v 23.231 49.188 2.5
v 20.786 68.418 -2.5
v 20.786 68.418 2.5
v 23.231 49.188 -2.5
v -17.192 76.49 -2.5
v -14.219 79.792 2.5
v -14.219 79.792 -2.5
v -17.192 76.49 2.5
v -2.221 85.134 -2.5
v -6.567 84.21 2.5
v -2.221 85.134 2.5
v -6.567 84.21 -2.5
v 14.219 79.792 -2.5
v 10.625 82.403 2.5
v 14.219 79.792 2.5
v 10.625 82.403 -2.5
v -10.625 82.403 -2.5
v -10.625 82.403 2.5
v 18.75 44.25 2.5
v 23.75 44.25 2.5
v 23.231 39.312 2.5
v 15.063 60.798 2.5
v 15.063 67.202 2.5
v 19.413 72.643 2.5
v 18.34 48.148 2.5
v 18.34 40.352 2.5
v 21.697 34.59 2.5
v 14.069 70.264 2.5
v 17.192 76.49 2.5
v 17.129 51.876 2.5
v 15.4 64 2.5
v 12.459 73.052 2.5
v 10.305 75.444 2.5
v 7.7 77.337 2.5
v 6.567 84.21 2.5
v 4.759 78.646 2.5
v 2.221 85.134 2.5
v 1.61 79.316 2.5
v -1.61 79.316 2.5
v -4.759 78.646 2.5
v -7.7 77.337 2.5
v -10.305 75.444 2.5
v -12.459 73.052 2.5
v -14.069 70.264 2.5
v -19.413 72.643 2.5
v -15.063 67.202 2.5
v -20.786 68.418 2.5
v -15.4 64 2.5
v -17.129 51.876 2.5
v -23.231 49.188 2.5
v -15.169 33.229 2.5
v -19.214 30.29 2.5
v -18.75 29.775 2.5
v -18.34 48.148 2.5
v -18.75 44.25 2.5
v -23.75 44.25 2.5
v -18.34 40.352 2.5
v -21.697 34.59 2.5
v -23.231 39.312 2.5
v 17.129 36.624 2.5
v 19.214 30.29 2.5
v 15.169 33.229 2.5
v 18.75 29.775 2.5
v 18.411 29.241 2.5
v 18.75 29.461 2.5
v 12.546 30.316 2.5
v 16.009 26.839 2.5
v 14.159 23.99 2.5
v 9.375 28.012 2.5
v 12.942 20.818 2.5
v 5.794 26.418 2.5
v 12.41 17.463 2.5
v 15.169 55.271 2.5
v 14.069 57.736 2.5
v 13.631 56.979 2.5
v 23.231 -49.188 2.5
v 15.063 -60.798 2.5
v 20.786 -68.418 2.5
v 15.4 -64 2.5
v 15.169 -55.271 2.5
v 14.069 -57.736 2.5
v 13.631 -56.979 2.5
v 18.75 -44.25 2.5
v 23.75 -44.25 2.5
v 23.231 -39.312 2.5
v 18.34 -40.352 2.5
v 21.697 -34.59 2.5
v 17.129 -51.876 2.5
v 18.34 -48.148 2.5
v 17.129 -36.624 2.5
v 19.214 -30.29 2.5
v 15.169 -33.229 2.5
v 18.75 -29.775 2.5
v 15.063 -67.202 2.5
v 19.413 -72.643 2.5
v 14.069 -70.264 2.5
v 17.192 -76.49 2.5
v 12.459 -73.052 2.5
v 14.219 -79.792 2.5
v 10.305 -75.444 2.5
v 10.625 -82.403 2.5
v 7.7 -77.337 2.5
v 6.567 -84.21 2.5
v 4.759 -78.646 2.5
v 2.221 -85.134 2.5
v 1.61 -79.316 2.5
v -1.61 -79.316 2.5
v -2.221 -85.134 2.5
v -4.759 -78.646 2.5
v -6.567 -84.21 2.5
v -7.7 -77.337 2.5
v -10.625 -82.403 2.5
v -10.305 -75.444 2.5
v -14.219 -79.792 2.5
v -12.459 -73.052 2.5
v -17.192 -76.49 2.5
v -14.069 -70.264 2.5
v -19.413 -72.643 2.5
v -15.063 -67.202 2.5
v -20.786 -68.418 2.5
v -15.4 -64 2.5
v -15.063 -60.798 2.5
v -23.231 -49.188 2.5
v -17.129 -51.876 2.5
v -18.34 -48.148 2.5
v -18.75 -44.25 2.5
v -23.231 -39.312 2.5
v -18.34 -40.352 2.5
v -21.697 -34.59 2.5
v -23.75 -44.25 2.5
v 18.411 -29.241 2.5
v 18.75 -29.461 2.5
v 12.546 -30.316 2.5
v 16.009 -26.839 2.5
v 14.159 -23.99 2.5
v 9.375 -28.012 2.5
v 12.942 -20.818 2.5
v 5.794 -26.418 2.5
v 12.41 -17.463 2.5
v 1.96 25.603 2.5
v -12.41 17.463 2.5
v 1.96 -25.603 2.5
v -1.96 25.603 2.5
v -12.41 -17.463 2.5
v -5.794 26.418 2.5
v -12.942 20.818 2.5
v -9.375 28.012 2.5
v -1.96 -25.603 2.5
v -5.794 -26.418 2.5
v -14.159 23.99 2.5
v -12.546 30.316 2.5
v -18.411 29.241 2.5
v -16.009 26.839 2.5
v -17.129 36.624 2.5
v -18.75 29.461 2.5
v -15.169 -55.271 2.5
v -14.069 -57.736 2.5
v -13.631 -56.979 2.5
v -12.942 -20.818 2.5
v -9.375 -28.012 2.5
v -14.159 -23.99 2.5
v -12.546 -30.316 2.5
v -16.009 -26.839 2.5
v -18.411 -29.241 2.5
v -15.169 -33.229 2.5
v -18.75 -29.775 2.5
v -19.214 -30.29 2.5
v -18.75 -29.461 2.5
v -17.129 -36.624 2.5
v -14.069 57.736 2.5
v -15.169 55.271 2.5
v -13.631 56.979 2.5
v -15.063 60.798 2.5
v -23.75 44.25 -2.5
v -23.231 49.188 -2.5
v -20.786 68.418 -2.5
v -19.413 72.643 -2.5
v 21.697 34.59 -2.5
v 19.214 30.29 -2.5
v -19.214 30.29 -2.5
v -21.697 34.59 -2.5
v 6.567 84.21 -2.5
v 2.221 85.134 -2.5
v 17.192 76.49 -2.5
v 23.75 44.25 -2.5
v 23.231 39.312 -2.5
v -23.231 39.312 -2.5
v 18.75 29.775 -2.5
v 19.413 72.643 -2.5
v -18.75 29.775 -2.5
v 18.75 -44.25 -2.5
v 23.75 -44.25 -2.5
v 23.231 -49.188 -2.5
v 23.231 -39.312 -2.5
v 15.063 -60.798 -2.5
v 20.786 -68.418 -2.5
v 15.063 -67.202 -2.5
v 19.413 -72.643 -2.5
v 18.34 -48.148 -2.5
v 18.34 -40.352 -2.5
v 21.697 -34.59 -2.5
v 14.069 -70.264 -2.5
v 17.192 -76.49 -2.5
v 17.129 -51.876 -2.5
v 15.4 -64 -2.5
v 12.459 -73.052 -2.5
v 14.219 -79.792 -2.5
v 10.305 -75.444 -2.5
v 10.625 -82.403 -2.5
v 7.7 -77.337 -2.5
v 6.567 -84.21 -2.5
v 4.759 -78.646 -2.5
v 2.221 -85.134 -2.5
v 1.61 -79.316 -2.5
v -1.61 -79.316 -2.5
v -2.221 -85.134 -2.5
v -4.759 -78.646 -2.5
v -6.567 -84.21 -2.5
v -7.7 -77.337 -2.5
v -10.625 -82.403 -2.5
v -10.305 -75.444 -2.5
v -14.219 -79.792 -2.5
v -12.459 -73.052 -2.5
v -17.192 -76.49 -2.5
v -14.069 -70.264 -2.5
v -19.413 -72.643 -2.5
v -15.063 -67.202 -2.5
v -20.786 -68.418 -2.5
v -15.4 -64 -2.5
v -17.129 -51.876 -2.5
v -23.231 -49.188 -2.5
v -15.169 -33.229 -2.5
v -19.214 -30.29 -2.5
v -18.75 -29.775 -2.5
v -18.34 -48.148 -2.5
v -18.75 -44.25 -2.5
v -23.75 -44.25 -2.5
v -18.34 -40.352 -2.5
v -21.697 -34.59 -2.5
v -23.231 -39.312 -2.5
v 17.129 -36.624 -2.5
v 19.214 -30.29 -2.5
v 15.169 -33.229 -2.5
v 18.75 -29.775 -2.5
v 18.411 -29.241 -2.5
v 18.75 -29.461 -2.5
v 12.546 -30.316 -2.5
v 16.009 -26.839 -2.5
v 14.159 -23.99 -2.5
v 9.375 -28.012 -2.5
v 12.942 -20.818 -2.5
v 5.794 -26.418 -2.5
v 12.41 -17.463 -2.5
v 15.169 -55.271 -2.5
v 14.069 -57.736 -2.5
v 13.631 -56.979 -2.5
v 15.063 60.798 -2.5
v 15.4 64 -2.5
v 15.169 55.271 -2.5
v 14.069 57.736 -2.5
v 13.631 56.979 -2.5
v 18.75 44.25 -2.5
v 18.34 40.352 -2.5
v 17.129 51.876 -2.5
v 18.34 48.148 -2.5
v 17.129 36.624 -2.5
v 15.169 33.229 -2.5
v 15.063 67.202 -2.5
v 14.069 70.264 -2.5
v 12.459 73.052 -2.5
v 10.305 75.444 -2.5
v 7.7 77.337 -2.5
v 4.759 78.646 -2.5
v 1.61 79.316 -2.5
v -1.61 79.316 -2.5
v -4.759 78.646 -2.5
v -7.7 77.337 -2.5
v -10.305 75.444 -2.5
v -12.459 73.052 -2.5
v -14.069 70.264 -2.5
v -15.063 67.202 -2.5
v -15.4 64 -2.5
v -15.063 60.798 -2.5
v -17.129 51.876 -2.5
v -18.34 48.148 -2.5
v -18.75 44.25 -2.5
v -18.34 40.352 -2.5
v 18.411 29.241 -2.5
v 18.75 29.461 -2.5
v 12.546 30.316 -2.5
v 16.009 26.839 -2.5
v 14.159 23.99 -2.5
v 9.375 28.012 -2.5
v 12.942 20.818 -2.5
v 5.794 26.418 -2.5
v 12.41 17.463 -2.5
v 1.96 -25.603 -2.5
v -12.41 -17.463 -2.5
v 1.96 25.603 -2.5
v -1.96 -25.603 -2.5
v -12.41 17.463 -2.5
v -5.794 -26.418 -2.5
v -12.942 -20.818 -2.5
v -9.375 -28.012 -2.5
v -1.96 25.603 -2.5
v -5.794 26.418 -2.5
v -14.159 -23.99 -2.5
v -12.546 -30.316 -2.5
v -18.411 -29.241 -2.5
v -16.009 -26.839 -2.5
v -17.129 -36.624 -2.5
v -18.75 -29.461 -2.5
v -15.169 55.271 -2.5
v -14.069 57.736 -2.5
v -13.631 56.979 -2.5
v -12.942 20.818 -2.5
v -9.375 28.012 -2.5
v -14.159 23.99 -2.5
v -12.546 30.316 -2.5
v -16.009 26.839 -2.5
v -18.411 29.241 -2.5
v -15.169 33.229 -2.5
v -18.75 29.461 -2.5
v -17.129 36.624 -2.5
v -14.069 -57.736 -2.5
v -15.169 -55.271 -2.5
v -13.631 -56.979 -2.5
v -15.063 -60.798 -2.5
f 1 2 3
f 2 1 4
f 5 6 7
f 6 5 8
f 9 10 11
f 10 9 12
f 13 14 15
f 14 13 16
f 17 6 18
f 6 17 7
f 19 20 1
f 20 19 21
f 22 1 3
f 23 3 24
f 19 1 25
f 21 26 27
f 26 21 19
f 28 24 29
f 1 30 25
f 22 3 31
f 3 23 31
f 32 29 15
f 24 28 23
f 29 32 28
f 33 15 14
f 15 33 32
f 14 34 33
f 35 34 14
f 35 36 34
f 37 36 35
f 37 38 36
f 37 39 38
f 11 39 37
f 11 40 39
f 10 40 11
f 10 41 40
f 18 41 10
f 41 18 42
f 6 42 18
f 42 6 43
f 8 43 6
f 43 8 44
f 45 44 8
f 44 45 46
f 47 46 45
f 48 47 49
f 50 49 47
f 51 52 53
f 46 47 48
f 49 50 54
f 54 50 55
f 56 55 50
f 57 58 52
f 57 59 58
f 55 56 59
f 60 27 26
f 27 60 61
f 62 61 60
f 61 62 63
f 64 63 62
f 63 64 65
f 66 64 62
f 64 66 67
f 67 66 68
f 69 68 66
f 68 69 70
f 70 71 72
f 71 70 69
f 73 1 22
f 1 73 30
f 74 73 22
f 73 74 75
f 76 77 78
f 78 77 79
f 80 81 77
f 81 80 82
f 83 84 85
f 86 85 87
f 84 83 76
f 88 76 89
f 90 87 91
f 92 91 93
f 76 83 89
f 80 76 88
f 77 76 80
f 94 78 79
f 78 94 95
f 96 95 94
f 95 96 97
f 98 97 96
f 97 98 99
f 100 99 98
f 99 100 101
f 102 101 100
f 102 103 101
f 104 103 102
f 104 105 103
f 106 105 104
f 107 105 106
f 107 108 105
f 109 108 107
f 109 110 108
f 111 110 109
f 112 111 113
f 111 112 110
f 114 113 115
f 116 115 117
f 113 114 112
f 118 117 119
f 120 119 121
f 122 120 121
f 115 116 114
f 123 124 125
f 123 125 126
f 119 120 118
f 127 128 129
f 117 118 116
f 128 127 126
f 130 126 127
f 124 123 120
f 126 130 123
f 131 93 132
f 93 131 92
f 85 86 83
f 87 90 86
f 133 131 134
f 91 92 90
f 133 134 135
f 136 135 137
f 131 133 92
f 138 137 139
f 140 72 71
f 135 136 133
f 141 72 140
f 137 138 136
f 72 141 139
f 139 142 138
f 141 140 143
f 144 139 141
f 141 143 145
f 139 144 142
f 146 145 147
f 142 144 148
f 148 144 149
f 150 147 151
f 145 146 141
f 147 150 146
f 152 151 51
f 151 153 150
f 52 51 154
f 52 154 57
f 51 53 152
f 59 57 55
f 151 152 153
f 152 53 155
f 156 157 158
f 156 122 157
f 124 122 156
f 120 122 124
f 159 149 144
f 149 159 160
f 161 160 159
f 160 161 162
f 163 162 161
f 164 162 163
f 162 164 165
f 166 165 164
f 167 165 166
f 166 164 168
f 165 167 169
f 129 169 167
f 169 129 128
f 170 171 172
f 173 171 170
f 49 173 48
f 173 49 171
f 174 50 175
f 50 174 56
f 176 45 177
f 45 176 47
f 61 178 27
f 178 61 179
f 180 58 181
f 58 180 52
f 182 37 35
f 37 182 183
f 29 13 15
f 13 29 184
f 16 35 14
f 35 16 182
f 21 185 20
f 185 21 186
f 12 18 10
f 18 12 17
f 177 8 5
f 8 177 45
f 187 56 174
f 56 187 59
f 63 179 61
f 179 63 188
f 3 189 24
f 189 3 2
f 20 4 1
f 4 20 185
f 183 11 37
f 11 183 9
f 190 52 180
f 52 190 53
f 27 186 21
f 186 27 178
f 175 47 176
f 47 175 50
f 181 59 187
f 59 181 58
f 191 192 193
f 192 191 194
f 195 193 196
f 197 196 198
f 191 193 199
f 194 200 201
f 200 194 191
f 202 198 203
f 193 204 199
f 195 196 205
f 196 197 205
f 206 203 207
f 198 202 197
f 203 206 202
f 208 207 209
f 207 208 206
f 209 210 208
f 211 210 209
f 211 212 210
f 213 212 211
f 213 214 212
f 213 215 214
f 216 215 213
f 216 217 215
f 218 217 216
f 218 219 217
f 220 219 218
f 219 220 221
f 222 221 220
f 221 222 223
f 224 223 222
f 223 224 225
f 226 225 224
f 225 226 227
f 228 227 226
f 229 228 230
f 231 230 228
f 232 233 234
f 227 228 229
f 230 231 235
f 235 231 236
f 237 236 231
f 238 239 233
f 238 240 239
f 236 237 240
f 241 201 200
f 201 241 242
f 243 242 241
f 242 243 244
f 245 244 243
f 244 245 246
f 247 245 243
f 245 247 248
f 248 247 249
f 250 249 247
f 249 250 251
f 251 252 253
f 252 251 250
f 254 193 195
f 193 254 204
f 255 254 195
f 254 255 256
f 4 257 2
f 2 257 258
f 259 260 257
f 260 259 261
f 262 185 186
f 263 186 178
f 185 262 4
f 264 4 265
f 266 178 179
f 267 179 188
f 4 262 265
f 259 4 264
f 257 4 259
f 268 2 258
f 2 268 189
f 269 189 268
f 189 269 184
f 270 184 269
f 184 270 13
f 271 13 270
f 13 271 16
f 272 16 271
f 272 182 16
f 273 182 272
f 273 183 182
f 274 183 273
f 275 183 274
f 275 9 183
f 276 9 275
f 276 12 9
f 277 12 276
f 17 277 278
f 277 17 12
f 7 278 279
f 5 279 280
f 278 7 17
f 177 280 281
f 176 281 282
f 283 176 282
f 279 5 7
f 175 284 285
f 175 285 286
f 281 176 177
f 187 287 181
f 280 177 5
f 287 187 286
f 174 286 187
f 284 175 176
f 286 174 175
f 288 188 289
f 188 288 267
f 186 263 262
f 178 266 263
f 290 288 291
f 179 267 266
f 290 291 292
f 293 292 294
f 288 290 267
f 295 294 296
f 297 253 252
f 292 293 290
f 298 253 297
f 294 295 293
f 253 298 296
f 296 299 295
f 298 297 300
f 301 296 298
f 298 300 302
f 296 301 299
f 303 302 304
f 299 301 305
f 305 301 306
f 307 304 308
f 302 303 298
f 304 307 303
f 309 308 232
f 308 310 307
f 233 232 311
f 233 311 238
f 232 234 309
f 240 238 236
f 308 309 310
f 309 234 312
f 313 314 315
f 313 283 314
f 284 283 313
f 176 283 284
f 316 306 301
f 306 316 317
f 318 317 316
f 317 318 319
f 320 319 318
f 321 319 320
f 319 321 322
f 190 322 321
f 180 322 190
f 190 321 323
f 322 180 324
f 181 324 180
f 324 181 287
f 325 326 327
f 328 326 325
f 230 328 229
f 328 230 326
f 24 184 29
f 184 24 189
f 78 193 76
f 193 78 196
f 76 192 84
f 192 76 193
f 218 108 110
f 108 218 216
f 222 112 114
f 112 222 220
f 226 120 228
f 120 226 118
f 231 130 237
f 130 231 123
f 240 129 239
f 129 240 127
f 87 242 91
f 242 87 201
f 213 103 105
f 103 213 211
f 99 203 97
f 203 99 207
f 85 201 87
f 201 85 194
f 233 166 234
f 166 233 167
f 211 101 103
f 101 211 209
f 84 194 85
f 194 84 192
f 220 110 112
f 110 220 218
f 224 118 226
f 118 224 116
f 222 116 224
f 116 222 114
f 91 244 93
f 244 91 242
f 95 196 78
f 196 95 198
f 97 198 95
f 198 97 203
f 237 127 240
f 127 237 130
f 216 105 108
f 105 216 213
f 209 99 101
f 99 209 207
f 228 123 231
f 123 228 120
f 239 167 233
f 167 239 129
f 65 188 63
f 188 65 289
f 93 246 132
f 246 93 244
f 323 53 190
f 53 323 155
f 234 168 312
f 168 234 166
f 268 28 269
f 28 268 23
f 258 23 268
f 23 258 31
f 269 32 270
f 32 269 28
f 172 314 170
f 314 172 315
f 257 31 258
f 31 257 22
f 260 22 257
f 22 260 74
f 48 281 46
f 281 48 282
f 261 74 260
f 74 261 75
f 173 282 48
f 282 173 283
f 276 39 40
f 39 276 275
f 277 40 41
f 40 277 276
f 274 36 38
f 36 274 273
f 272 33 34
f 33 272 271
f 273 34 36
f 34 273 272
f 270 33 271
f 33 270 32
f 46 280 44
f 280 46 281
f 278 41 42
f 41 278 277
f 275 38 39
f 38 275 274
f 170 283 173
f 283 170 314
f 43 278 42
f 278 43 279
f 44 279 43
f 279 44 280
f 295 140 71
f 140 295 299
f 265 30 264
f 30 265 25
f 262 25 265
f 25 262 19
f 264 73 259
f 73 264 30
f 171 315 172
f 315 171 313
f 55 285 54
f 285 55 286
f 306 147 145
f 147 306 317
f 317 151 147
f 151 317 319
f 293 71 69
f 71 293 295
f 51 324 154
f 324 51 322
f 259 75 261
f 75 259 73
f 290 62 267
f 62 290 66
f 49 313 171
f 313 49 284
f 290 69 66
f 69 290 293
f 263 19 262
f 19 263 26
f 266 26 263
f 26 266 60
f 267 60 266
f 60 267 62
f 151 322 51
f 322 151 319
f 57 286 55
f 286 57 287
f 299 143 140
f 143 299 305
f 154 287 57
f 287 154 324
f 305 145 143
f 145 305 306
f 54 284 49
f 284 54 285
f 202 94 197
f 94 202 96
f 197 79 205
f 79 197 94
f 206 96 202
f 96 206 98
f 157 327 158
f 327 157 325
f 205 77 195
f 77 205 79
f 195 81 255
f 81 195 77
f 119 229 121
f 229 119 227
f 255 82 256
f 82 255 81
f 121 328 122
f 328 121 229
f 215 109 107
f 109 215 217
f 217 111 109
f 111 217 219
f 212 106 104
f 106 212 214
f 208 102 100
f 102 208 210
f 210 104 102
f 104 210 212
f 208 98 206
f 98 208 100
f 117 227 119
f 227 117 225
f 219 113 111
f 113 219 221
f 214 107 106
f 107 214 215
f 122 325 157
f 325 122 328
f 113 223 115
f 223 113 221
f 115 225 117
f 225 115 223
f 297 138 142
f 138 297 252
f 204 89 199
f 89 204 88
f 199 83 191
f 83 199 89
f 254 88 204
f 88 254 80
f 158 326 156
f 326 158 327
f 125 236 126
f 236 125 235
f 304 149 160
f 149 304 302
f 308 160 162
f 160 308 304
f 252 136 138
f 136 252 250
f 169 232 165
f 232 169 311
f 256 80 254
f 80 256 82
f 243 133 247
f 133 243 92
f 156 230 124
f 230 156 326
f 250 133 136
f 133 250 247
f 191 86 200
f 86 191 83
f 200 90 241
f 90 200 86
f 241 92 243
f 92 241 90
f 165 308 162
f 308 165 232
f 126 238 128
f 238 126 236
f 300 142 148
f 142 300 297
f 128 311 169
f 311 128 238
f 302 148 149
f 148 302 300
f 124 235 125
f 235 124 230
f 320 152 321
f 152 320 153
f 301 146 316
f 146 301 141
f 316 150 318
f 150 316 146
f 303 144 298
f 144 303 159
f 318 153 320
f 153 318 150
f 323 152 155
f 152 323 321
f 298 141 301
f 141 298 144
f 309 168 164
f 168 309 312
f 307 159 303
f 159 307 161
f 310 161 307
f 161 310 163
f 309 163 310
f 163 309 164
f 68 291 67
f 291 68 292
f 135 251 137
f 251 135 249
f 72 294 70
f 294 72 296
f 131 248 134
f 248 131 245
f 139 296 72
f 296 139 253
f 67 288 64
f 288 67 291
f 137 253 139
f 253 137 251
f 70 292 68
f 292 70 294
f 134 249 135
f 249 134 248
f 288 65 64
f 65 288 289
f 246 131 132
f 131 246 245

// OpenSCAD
lipdiameter=37.5; //[22:52]
neckdiameter=30.8; //[20:50]
bottlewidth=128; //[80:200]
thickness=5; //1
beveled_handle=true; //comment

difference(){
    union(){
        cube([lipdiameter,bottlewidth,thickness],center=true);
        for (i = [0:1]) {
            rotate([i*180,0,0])
            hull(){
                translate([0,bottlewidth/2,0]) cylinder(d=lipdiameter+5,h=thickness, center=true);
                translate([0,bottlewidth/2-lipdiameter/2-1,0]) cylinder(d=lipdiameter+10,h=thickness, center=true);
            }
        }
    }

    for (i = [0:1]) {
        rotate([i*180,0,0]) union() {
        translate([0,bottlewidth/2,0]) cylinder(d=neckdiameter,h=thickness+1, center=true);
        translate([0,bottlewidth/2-lipdiameter/2-1,0]) cylinder(d=lipdiameter,h=thickness+1, center=true);
        }
    }
    if(beveled_handle){
        hull(){
            translate([0,bottlewidth/2-lipdiameter/2,0]) rotate ([0,0,135]) translate([0,lipdiameter+3,0]) cylinder(d=lipdiameter-5,h=thickness+1, center=true);
            translate([0,-(bottlewidth/2-lipdiameter/2),0]) rotate ([0,0,45]) translate([0,lipdiameter+3,0]) cylinder(d=lipdiameter-5,h=thickness+1, center=true);
        }
        
        hull(){
            translate([0,bottlewidth/2-lipdiameter/2,0]) rotate ([0,0,-135]) translate([0,lipdiameter+3,0]) cylinder(d=lipdiameter-5,h=thickness+1, center=true);
            translate([0,-(bottlewidth/2-lipdiameter/2),0]) rotate ([0,0,-45]) translate([0,lipdiameter+3,0]) cylinder(d=lipdiameter-5,h=thickness+1, center=true);
        }
    }
}

